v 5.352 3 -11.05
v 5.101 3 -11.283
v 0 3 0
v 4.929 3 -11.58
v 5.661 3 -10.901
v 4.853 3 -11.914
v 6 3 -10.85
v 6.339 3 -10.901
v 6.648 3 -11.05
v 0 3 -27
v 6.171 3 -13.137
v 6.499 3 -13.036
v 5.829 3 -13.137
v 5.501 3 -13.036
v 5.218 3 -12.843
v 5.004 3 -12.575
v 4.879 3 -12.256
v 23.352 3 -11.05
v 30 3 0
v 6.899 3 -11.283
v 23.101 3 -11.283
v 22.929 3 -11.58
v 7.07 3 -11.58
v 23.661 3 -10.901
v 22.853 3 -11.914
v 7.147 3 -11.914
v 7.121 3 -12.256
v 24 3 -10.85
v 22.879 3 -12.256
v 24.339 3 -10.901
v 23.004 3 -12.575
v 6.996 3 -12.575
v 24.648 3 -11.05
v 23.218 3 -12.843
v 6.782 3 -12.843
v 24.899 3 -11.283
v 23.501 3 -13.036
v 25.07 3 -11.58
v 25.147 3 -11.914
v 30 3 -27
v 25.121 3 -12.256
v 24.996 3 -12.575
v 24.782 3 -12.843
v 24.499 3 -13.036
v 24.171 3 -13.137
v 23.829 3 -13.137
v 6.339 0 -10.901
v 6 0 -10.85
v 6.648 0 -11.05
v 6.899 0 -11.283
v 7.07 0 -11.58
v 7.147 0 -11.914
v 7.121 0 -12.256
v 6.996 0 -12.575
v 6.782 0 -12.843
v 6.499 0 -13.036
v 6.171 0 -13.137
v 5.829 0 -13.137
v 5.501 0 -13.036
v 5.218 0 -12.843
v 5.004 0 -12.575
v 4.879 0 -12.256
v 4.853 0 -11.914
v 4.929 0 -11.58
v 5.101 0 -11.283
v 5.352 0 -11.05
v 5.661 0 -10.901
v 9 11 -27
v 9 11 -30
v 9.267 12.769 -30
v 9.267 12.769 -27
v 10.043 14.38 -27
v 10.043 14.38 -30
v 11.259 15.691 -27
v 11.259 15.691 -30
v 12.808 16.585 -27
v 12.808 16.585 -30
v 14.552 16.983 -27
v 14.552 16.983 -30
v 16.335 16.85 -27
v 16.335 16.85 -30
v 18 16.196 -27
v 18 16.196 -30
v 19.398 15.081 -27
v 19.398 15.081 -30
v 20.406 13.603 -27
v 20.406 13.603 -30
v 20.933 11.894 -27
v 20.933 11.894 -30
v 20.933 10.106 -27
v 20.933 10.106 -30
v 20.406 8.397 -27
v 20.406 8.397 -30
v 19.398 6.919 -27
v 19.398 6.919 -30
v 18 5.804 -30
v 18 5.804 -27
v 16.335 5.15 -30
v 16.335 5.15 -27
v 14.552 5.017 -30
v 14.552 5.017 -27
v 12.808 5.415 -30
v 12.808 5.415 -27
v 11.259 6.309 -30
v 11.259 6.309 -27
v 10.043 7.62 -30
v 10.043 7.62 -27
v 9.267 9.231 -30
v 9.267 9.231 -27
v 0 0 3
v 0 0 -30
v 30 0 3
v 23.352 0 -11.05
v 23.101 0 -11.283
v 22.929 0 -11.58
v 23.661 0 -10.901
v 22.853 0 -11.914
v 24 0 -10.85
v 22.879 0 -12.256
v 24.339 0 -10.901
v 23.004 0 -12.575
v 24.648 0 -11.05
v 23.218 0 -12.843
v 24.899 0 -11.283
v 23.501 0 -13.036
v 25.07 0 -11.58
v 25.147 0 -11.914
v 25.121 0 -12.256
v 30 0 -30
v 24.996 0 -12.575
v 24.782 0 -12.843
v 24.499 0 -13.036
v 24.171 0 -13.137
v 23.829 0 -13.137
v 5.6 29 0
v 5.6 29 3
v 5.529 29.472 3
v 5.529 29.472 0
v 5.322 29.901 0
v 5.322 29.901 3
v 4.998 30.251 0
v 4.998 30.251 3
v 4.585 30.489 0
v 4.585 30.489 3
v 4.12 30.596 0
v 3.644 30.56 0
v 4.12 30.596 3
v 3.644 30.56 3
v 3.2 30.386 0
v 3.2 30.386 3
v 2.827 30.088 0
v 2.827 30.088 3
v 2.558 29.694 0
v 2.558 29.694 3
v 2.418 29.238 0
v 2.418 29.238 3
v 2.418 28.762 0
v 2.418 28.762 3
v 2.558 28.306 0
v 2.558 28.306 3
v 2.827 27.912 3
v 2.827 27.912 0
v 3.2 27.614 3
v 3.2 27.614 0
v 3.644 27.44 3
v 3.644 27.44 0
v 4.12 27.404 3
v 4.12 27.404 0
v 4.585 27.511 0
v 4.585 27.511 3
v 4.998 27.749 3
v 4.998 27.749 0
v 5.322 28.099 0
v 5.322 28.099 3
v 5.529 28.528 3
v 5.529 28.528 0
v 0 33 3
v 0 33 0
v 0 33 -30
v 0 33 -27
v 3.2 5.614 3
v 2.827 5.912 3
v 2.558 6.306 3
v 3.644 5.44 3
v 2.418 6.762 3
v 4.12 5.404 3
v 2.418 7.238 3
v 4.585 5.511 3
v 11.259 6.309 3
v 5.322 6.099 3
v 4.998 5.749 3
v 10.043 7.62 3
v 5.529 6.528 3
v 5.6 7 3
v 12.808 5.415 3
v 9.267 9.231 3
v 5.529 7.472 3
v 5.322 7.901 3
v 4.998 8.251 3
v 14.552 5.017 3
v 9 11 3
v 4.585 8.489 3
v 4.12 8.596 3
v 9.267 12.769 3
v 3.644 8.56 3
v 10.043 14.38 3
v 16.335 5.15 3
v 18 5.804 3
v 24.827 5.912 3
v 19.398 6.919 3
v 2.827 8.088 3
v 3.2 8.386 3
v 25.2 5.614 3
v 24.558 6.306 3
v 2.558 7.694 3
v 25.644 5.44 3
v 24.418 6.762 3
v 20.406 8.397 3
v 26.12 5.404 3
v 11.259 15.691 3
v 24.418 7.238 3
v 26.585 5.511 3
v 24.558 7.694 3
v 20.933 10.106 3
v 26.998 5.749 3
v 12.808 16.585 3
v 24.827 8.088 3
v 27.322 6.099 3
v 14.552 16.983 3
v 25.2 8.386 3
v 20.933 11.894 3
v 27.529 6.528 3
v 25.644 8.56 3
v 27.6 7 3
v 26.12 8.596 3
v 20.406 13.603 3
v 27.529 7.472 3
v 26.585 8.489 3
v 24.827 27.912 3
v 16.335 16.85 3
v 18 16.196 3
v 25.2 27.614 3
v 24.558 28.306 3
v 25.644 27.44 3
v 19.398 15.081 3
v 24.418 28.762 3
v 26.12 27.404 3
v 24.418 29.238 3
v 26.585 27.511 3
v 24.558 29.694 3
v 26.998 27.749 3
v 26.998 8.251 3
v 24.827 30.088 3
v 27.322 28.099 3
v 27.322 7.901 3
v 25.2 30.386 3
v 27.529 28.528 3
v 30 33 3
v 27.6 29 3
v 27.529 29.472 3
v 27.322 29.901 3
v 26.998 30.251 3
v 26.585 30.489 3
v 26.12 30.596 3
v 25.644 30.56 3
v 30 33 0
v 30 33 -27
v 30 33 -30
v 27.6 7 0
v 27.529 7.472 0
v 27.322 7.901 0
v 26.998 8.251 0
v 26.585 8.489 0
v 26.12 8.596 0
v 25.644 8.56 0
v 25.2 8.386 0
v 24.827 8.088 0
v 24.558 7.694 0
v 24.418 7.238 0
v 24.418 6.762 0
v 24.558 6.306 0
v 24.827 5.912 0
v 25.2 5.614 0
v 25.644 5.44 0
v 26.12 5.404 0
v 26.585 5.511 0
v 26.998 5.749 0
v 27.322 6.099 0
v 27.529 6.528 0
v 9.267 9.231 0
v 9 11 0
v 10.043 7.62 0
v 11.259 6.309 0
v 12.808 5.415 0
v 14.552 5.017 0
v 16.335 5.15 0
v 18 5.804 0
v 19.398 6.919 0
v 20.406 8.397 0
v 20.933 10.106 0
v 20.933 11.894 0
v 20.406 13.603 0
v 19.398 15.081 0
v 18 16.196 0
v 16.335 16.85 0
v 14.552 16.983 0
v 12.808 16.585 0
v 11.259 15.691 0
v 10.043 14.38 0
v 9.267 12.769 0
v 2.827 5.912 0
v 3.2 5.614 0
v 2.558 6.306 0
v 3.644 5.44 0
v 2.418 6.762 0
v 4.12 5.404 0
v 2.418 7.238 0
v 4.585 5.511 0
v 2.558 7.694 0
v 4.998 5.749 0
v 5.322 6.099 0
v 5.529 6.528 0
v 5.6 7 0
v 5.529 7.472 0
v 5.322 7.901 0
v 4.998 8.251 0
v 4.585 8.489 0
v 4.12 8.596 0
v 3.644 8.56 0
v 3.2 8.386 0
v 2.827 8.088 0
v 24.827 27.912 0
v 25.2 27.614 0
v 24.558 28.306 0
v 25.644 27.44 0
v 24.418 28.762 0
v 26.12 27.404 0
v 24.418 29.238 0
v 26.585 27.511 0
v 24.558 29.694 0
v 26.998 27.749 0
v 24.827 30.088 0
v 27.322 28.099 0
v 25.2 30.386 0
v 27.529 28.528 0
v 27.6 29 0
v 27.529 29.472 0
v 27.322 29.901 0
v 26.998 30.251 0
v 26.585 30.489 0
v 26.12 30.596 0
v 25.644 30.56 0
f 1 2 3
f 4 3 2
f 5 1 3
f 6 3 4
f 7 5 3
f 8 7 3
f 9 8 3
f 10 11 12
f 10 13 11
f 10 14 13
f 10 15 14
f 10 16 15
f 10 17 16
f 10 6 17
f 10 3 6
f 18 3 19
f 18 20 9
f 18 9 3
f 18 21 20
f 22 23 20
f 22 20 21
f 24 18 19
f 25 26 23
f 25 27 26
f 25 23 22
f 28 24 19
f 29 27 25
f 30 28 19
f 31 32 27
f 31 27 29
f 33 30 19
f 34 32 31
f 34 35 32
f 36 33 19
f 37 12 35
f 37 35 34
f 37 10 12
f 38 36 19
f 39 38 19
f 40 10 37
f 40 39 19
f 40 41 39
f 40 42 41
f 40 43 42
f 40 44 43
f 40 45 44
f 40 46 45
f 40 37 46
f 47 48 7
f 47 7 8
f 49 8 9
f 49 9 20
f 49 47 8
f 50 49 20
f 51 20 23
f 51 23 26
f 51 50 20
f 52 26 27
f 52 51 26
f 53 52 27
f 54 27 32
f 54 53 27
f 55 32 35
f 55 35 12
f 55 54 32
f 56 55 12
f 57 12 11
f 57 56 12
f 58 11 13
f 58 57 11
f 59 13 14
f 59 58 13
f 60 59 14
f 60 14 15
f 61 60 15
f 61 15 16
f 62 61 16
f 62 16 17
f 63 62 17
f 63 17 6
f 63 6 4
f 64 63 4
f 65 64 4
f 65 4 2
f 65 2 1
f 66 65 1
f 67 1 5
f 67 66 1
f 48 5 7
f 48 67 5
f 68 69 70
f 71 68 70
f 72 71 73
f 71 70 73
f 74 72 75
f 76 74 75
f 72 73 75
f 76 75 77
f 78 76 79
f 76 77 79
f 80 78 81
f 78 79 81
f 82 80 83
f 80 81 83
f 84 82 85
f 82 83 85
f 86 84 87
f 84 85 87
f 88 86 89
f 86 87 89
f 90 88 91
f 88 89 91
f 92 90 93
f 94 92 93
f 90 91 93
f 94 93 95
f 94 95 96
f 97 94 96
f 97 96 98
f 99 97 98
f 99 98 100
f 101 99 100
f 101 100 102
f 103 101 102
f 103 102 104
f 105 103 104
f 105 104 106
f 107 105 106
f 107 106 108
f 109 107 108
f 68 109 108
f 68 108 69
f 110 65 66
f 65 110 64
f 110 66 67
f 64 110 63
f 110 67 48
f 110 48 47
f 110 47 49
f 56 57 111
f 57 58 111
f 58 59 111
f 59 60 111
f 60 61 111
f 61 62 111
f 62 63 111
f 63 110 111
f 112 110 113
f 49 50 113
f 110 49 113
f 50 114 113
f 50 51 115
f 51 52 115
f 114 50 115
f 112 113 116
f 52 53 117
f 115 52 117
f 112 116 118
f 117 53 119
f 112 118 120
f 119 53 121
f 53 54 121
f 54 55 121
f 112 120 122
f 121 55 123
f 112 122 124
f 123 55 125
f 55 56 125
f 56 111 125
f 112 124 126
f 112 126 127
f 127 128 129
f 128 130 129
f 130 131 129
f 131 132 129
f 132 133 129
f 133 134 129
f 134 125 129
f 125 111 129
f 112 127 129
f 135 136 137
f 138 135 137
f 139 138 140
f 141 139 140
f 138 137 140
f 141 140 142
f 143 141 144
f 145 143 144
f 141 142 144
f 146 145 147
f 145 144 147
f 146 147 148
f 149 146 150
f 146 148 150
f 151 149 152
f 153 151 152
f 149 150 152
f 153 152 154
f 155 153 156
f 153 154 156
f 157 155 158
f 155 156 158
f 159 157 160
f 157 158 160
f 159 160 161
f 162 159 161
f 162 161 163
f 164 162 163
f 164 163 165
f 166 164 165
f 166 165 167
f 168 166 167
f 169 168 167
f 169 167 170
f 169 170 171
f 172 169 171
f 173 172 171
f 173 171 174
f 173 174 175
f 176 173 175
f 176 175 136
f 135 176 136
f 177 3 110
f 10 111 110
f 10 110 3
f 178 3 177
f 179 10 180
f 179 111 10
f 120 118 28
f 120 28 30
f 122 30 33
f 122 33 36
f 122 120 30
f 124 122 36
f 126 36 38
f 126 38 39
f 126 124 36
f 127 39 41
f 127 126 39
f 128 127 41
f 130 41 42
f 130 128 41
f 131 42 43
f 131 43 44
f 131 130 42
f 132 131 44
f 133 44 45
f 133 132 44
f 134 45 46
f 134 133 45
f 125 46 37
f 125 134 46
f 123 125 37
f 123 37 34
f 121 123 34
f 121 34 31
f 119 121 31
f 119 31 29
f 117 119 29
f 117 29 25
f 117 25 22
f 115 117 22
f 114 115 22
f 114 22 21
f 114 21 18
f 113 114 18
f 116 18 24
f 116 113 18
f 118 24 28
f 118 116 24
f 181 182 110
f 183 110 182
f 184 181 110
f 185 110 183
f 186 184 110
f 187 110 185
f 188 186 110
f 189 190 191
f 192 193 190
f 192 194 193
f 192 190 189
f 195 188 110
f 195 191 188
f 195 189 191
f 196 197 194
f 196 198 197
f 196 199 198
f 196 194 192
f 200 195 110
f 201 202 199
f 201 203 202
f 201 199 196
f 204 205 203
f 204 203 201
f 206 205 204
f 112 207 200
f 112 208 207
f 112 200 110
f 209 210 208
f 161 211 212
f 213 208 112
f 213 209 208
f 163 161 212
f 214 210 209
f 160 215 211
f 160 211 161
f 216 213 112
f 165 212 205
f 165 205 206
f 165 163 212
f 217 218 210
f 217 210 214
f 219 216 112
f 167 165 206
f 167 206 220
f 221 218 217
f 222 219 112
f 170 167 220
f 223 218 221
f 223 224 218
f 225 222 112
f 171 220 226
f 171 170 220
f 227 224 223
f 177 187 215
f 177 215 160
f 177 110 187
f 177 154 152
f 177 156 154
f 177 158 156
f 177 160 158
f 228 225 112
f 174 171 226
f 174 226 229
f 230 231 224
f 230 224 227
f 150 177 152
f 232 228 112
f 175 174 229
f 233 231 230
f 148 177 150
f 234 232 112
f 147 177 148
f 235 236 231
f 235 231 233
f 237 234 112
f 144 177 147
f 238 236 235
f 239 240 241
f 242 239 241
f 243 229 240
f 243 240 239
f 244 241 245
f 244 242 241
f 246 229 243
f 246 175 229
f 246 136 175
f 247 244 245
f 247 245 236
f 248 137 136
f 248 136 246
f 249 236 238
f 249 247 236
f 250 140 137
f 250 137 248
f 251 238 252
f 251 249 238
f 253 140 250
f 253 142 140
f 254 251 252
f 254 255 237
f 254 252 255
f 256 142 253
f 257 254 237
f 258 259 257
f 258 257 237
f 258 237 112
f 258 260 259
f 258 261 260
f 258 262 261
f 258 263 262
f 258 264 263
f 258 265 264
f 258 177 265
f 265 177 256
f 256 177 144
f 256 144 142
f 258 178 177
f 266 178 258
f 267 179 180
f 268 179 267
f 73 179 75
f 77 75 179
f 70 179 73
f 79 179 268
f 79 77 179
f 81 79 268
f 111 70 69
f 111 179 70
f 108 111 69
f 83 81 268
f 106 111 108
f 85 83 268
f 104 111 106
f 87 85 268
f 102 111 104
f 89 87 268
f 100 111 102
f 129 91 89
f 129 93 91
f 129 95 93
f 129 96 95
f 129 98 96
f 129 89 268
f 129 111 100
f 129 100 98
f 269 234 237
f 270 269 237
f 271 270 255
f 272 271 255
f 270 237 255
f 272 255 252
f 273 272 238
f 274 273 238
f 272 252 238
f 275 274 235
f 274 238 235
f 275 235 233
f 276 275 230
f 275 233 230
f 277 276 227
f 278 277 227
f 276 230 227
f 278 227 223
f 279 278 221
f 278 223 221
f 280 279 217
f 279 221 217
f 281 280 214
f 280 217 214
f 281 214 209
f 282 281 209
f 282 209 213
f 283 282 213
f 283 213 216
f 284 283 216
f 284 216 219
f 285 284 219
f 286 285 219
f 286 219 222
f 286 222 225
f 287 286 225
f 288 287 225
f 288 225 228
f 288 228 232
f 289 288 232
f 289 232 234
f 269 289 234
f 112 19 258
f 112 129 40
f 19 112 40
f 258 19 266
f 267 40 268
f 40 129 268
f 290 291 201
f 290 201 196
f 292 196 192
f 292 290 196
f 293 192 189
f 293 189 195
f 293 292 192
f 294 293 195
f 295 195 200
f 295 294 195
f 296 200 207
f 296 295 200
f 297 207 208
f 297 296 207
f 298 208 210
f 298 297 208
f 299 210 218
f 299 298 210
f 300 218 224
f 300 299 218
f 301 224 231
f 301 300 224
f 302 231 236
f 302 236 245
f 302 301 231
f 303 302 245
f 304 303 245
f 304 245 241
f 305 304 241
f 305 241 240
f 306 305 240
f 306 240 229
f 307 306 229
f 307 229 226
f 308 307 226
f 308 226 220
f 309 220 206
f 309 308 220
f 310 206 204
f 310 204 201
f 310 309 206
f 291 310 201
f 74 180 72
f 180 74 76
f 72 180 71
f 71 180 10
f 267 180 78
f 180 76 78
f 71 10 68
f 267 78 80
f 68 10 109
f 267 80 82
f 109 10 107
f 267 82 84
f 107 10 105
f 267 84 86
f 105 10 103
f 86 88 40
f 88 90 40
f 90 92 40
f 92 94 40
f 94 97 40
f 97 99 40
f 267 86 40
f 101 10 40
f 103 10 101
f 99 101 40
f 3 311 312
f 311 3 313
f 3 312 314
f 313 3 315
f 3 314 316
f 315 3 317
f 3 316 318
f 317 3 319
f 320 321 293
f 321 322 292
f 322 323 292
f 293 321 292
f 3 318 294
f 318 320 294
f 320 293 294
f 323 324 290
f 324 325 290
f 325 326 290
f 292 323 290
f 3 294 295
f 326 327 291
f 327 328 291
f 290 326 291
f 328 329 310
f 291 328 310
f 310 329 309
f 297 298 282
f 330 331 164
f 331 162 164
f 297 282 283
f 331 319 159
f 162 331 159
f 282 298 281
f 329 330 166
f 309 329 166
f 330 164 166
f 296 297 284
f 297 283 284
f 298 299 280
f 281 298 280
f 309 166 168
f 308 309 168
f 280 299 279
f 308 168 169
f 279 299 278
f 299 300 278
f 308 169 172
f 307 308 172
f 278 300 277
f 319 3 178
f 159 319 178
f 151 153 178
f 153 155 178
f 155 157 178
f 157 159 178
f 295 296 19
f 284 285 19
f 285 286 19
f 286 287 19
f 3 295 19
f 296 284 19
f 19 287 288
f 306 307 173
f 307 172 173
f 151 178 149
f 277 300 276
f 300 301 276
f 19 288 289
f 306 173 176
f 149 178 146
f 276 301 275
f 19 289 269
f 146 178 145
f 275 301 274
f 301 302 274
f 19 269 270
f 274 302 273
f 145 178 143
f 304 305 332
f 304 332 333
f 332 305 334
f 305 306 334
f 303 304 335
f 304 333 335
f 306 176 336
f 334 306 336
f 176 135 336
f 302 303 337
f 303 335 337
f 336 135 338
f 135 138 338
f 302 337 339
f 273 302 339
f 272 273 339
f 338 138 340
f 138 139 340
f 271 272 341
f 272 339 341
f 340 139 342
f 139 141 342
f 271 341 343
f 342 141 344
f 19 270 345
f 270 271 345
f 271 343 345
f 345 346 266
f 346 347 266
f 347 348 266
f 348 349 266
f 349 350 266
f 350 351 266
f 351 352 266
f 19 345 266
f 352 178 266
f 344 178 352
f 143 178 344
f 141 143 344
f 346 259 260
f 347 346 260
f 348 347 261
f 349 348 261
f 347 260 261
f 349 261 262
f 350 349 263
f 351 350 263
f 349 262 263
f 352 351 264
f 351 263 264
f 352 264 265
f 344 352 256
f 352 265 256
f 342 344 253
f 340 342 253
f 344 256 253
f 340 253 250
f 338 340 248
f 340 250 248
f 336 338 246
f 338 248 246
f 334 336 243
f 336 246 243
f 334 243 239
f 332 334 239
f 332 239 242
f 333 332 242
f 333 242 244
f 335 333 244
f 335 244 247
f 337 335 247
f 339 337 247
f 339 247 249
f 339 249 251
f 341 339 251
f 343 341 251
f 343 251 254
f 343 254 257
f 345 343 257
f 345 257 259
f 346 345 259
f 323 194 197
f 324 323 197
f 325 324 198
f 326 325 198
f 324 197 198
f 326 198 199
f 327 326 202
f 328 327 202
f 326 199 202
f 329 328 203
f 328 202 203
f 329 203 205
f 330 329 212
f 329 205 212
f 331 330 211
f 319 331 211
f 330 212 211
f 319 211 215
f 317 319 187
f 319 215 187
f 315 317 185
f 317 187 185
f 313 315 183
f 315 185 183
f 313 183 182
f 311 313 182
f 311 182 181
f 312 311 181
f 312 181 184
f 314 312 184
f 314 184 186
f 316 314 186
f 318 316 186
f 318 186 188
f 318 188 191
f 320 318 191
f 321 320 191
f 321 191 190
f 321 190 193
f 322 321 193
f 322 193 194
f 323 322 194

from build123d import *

# Parameters (mm, degrees)
SKETCH1_W           = 30
SKETCH1_H           = 30
SKETCH1_R           = 1.15
BOSS_EXTRUDE1_DEPTH = 3
SKETCH2_W           = 30
SKETCH2_H           = 3
BOSS_EXTRUDE2_DEPTH = 30
CUT_EXTRUDE1_REACH  = 55.749
SKETCH3_R           = 6
SKETCH4_W           = 30
SKETCH4_H           = 33
SKETCH4_R           = 6
BOSS_EXTRUDE3_DEPTH = 3
CUT_EXTRUDE3_REACH  = 57.48
SKETCH5_R           = 1.6


with BuildPart() as part:
    # Sketch1 → Boss-Extrude1 (new body)
    with BuildSketch(Plane(origin=(0, 0, 0), x_dir=(1, 0, 0), z_dir=(0, 1, 0))):
        with Locations((15, 15)):
            Rectangle(SKETCH1_W, SKETCH1_H)
        with Locations(Location((5.999988, 12, 0), (0, 0, 270))):
            Circle(SKETCH1_R, mode=Mode.SUBTRACT)
        with Locations(Location((23.999988, 12, 0), (0, 0, 270))):
            Circle(SKETCH1_R, mode=Mode.SUBTRACT)
    extrude(amount=BOSS_EXTRUDE1_DEPTH)

    # Sketch2 → Boss-Extrude2 (add)
    with BuildSketch(Plane(origin=(0, 3, 0), x_dir=(1, 0, 0), z_dir=(0, 1, 0))):
        with Locations((15, 28.5)):
            Rectangle(SKETCH2_W, SKETCH2_H)
    extrude(amount=BOSS_EXTRUDE2_DEPTH)

    # Sketch3 → Cut-Extrude1 (cut, up to next)
    with BuildSketch(Plane(origin=(0, 0, -30), x_dir=(-1, 0, 0), z_dir=(0, 0, -1)), mode=Mode.PRIVATE) as cut_extrude1_sk1:
        with Locations((-15, 11)):
            Circle(SKETCH3_R)
    cut_extrude1_tool1 = extrude(cut_extrude1_sk1.sketch, amount=-CUT_EXTRUDE1_REACH, mode=Mode.PRIVATE) & part.part
    add(cut_extrude1_tool1.solids().sort_by_distance((15, 11, -30))[0], mode=Mode.SUBTRACT)

    # Sketch4 → Boss-Extrude3 (add)
    with BuildSketch(Plane.XY):
        with Locations((15, 16.5)):
            Rectangle(SKETCH4_W, SKETCH4_H)
        with Locations(Location((15, 11, 0), (0, 0, 180))):
            Circle(SKETCH4_R, mode=Mode.SUBTRACT)
    extrude(amount=BOSS_EXTRUDE3_DEPTH)

    # Sketch5 → Cut-Extrude3 (cut, up to next)
    with BuildSketch(Plane.XY.offset(3), mode=Mode.PRIVATE) as cut_extrude3_sk1:
        with Locations((26, 7)):
            Circle(SKETCH5_R)
    cut_extrude3_tool1 = extrude(cut_extrude3_sk1.sketch, amount=-CUT_EXTRUDE3_REACH, mode=Mode.PRIVATE) & part.part
    # Sketch5 → Cut-Extrude3 (cut, up to next)
    with BuildSketch(Plane.XY.offset(3), mode=Mode.PRIVATE) as cut_extrude3_sk2:
        with Locations((4, 7)):
            Circle(SKETCH5_R)
    cut_extrude3_tool2 = extrude(cut_extrude3_sk2.sketch, amount=-CUT_EXTRUDE3_REACH, mode=Mode.PRIVATE) & part.part
    # Sketch5 → Cut-Extrude3 (cut, up to next)
    with BuildSketch(Plane.XY.offset(3), mode=Mode.PRIVATE) as cut_extrude3_sk3:
        with Locations((4, 29)):
            Circle(SKETCH5_R)
    cut_extrude3_tool3 = extrude(cut_extrude3_sk3.sketch, amount=-CUT_EXTRUDE3_REACH, mode=Mode.PRIVATE) & part.part
    # Sketch5 → Cut-Extrude3 (cut, up to next)
    with BuildSketch(Plane.XY.offset(3), mode=Mode.PRIVATE) as cut_extrude3_sk4:
        with Locations((26, 29)):
            Circle(SKETCH5_R)
    cut_extrude3_tool4 = extrude(cut_extrude3_sk4.sketch, amount=-CUT_EXTRUDE3_REACH, mode=Mode.PRIVATE) & part.part
    add(cut_extrude3_tool1.solids().sort_by_distance((26, 7, 3))[0], mode=Mode.SUBTRACT)
    add(cut_extrude3_tool2.solids().sort_by_distance((4, 7, 3))[0], mode=Mode.SUBTRACT)
    add(cut_extrude3_tool3.solids().sort_by_distance((4, 29, 3))[0], mode=Mode.SUBTRACT)
    add(cut_extrude3_tool4.solids().sort_by_distance((26, 29, 3))[0], mode=Mode.SUBTRACT)


solid = part.part
